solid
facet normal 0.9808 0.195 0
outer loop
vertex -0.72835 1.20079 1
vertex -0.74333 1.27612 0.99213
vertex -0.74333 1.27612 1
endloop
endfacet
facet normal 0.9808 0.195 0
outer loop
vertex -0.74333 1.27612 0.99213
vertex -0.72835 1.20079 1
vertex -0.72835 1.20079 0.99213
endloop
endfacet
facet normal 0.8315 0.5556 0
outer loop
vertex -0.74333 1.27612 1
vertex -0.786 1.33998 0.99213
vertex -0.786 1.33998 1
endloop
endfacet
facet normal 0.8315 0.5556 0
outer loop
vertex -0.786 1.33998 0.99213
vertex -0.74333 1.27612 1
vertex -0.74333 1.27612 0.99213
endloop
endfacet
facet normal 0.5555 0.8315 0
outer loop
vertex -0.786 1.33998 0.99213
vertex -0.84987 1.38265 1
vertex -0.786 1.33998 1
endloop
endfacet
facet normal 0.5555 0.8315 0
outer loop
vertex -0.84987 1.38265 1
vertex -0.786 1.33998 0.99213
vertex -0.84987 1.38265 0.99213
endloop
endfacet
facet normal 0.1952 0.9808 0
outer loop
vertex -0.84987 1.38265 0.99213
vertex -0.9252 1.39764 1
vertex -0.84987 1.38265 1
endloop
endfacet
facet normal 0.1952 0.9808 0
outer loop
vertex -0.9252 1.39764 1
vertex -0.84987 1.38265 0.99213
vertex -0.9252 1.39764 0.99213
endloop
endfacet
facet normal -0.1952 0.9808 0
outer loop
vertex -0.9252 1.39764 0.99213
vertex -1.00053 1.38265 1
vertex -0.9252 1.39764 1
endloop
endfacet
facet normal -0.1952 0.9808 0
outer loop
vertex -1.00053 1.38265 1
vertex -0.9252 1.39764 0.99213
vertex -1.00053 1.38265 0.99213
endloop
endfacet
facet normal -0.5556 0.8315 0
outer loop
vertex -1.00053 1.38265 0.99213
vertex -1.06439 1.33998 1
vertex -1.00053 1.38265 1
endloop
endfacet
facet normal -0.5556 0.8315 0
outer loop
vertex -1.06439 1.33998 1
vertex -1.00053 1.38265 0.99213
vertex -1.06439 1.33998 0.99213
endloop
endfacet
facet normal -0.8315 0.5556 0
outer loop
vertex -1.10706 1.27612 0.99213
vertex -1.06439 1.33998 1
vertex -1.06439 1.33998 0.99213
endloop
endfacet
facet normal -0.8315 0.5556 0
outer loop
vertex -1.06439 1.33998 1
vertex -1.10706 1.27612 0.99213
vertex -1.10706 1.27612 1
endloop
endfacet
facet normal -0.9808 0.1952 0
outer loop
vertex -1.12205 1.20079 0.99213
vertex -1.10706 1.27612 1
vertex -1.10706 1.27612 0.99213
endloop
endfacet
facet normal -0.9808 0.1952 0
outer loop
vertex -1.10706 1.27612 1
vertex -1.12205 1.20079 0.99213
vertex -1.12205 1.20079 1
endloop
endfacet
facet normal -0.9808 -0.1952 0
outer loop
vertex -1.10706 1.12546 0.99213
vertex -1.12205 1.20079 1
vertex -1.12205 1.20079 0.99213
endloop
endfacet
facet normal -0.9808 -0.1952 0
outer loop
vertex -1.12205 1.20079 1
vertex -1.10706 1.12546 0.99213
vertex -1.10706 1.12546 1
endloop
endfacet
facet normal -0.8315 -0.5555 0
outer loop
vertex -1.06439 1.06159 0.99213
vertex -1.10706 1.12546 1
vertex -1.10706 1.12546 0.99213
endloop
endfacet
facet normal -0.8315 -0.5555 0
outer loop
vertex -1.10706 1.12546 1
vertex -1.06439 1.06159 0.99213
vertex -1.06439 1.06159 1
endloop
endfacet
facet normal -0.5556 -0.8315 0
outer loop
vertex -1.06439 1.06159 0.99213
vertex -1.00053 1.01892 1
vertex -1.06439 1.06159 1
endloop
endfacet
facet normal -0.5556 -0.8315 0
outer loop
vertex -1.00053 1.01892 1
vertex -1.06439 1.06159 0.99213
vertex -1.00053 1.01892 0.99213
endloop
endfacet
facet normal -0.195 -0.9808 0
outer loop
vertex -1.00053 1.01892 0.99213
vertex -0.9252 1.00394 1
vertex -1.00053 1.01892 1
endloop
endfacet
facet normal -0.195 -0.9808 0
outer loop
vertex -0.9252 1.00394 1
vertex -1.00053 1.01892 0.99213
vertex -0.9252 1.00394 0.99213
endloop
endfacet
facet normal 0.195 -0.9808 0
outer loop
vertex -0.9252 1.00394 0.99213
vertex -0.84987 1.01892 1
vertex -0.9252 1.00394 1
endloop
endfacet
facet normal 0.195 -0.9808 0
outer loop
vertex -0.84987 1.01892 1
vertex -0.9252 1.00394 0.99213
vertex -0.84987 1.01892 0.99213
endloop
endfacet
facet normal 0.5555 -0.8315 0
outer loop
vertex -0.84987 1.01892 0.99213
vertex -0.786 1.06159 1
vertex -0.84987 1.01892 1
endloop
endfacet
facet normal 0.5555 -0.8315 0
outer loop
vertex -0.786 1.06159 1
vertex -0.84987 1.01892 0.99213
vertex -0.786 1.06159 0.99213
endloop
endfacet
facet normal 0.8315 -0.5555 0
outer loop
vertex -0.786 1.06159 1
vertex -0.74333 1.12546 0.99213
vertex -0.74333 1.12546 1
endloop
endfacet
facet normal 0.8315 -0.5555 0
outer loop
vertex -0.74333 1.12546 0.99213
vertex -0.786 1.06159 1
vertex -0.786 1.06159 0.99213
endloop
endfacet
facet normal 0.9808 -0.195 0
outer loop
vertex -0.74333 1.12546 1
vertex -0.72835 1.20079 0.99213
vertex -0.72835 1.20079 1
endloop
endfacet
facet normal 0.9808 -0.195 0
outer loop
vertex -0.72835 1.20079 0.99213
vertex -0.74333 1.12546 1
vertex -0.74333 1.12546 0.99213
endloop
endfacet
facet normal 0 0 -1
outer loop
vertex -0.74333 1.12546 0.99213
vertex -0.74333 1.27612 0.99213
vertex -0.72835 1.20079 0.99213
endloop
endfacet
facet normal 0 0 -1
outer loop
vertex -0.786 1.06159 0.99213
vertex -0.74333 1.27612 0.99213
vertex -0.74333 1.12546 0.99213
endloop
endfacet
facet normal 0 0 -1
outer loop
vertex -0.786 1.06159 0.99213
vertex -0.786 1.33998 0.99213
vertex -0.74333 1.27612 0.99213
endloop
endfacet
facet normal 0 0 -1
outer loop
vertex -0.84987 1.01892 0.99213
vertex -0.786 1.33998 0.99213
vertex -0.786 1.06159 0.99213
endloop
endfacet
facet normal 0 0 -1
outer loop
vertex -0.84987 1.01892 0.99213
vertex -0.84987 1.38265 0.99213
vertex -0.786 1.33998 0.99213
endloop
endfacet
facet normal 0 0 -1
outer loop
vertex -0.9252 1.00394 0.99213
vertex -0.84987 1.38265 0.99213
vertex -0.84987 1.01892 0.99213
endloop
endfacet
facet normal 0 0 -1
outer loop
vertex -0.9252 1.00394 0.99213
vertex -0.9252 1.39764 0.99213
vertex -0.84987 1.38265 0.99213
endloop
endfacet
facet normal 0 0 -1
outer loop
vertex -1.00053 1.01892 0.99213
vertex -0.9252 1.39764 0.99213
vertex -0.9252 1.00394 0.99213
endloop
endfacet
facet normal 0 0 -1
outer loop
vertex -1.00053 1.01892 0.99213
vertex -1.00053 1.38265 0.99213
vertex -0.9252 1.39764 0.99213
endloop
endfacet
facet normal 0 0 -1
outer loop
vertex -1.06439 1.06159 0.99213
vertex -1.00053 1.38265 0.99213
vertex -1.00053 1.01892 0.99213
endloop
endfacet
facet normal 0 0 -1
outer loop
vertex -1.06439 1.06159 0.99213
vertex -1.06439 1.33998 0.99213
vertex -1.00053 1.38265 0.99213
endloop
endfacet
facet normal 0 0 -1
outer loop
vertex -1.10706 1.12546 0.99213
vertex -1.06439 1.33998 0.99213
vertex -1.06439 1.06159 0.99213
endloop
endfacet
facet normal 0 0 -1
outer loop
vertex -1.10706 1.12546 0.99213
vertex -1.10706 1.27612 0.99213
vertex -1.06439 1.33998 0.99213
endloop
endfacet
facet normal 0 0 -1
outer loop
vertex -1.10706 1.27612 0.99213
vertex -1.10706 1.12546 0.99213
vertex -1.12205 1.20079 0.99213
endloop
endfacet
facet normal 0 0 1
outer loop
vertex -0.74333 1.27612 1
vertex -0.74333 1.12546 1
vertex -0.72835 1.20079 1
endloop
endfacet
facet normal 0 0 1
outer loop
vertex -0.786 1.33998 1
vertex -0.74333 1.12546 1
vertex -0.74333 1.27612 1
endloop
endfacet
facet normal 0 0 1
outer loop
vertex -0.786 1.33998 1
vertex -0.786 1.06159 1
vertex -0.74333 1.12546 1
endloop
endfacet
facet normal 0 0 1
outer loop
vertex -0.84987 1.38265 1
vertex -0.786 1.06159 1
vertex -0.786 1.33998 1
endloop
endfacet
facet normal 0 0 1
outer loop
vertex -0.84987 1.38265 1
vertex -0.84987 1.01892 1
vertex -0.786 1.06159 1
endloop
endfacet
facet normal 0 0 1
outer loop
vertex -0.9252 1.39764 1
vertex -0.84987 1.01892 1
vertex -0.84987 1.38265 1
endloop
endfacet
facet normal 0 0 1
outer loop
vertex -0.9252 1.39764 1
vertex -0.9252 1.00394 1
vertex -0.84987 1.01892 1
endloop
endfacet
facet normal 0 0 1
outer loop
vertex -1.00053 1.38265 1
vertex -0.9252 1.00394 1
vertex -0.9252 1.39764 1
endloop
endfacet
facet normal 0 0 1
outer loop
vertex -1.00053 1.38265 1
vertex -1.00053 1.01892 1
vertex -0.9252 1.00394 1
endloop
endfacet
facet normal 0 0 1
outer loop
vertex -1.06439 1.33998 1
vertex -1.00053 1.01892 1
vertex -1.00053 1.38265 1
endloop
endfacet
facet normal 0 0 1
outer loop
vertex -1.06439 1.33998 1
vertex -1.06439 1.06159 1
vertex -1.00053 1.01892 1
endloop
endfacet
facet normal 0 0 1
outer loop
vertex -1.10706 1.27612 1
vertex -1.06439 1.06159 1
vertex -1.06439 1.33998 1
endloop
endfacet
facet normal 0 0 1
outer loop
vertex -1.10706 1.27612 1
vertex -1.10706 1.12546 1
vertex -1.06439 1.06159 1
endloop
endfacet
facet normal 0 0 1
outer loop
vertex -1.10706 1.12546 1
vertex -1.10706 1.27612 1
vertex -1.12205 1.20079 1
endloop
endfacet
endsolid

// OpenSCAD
// file: defines.scad
w = 9.7;
h = 10.10;
t = 2.5;
pcb_t = 0.8;
pin_fragments = 16;

scale = 1/2.54;
// main file
// example012.stl is Mblock.stl, (c) 2009 Will Langford
// licensed under the Creative Commons - GNU GPL license.
// http://www.thingiverse.com/thing:753

//import("sim800c.stl", convexity=3);

// PCB

include <defines.scad>

color("Red")
  scale(scale)
  translate([-w/2 + 2.5,  h/2 - 2.0, t+0.02])
    cylinder(r = 0.5, h = 0.02, $fn = 16);
